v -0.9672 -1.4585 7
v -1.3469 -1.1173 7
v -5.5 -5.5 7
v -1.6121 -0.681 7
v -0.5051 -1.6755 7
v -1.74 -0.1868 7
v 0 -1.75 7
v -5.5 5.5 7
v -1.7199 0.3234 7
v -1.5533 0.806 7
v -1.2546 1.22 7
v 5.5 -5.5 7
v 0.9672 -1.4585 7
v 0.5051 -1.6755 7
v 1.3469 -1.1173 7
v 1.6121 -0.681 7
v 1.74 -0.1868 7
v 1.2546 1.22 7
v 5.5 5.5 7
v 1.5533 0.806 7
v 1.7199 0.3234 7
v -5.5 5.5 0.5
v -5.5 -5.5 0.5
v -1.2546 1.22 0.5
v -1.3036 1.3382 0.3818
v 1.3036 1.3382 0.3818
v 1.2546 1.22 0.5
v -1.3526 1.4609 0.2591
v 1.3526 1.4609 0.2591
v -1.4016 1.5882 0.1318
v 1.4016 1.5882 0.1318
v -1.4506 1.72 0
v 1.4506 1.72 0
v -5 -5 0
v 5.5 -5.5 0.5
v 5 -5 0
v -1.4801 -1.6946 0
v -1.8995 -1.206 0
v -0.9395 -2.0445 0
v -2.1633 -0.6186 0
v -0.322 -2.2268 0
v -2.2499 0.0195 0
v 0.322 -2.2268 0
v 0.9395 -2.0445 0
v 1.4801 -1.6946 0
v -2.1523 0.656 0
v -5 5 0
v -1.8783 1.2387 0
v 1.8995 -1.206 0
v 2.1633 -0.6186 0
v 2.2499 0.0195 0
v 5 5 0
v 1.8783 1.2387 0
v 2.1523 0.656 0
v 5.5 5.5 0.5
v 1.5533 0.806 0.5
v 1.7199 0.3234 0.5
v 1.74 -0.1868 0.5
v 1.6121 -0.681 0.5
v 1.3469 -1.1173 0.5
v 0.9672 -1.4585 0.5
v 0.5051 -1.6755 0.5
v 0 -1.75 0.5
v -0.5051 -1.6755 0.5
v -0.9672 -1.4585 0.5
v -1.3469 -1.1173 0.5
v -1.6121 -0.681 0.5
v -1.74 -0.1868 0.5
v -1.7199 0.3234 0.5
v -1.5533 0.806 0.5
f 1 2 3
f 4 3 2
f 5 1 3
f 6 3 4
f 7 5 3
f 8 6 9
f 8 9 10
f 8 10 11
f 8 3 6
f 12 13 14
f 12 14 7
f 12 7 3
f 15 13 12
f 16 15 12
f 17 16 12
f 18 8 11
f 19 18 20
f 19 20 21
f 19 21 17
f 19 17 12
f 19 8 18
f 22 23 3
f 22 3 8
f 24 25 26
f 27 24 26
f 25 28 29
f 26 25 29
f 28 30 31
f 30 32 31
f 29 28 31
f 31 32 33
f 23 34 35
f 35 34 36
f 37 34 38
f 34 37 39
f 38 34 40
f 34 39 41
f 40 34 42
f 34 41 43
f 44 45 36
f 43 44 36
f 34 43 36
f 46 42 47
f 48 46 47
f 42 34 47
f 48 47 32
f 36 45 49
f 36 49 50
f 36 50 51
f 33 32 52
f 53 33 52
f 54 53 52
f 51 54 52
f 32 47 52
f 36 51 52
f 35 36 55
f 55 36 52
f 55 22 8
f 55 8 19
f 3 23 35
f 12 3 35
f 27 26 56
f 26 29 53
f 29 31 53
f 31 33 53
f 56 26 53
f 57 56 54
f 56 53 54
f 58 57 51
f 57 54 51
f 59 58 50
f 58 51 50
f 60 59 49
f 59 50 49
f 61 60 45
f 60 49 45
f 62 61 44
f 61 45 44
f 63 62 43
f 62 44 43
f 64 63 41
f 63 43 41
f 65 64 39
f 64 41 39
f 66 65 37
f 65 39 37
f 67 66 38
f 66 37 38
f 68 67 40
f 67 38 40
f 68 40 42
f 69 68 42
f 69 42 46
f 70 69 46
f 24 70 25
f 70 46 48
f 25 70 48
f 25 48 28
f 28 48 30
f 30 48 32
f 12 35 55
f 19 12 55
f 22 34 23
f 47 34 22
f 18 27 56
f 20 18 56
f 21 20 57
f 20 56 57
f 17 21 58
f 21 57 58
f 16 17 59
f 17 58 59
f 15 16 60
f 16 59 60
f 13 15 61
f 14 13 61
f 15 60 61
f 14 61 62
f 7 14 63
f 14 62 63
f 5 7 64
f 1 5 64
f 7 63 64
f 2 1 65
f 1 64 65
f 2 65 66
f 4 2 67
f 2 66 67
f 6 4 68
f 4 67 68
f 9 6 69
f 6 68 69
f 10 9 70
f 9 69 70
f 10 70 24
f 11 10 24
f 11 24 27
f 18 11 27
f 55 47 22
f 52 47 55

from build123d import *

# Parameters (mm, degrees)
F0_W     = 11
F0_H     = 11
F1_DEPTH = 7
F2_SIZE  = 0.5


with BuildPart() as f1:
    # F0 (on Top) → F1 (new body)
    with BuildSketch(Plane.XY):
        Rectangle(F0_W, F0_H)
        with BuildLine():
            ThreePointArc((1.254631, 1.22), (0, -1.75), (-1.254631, 1.22))
            Line((-1.254631, 1.22), (1.254631, 1.22))
        make_face(mode=Mode.SUBTRACT)
    extrude(amount=F1_DEPTH)

    # F2
    f2_edges = [f1.edges().sort_by_distance(p)[0] for p in [
        (5.5, 0, 0),
        (0, 5.5, 0),
        (-5.5, 0, 0),
        (0, -5.5, 0),
        (0, 1.22, 0),
        (0, -1.75, 0),
    ]]
    chamfer(f2_edges, length=F2_SIZE)


solid = f1.part
